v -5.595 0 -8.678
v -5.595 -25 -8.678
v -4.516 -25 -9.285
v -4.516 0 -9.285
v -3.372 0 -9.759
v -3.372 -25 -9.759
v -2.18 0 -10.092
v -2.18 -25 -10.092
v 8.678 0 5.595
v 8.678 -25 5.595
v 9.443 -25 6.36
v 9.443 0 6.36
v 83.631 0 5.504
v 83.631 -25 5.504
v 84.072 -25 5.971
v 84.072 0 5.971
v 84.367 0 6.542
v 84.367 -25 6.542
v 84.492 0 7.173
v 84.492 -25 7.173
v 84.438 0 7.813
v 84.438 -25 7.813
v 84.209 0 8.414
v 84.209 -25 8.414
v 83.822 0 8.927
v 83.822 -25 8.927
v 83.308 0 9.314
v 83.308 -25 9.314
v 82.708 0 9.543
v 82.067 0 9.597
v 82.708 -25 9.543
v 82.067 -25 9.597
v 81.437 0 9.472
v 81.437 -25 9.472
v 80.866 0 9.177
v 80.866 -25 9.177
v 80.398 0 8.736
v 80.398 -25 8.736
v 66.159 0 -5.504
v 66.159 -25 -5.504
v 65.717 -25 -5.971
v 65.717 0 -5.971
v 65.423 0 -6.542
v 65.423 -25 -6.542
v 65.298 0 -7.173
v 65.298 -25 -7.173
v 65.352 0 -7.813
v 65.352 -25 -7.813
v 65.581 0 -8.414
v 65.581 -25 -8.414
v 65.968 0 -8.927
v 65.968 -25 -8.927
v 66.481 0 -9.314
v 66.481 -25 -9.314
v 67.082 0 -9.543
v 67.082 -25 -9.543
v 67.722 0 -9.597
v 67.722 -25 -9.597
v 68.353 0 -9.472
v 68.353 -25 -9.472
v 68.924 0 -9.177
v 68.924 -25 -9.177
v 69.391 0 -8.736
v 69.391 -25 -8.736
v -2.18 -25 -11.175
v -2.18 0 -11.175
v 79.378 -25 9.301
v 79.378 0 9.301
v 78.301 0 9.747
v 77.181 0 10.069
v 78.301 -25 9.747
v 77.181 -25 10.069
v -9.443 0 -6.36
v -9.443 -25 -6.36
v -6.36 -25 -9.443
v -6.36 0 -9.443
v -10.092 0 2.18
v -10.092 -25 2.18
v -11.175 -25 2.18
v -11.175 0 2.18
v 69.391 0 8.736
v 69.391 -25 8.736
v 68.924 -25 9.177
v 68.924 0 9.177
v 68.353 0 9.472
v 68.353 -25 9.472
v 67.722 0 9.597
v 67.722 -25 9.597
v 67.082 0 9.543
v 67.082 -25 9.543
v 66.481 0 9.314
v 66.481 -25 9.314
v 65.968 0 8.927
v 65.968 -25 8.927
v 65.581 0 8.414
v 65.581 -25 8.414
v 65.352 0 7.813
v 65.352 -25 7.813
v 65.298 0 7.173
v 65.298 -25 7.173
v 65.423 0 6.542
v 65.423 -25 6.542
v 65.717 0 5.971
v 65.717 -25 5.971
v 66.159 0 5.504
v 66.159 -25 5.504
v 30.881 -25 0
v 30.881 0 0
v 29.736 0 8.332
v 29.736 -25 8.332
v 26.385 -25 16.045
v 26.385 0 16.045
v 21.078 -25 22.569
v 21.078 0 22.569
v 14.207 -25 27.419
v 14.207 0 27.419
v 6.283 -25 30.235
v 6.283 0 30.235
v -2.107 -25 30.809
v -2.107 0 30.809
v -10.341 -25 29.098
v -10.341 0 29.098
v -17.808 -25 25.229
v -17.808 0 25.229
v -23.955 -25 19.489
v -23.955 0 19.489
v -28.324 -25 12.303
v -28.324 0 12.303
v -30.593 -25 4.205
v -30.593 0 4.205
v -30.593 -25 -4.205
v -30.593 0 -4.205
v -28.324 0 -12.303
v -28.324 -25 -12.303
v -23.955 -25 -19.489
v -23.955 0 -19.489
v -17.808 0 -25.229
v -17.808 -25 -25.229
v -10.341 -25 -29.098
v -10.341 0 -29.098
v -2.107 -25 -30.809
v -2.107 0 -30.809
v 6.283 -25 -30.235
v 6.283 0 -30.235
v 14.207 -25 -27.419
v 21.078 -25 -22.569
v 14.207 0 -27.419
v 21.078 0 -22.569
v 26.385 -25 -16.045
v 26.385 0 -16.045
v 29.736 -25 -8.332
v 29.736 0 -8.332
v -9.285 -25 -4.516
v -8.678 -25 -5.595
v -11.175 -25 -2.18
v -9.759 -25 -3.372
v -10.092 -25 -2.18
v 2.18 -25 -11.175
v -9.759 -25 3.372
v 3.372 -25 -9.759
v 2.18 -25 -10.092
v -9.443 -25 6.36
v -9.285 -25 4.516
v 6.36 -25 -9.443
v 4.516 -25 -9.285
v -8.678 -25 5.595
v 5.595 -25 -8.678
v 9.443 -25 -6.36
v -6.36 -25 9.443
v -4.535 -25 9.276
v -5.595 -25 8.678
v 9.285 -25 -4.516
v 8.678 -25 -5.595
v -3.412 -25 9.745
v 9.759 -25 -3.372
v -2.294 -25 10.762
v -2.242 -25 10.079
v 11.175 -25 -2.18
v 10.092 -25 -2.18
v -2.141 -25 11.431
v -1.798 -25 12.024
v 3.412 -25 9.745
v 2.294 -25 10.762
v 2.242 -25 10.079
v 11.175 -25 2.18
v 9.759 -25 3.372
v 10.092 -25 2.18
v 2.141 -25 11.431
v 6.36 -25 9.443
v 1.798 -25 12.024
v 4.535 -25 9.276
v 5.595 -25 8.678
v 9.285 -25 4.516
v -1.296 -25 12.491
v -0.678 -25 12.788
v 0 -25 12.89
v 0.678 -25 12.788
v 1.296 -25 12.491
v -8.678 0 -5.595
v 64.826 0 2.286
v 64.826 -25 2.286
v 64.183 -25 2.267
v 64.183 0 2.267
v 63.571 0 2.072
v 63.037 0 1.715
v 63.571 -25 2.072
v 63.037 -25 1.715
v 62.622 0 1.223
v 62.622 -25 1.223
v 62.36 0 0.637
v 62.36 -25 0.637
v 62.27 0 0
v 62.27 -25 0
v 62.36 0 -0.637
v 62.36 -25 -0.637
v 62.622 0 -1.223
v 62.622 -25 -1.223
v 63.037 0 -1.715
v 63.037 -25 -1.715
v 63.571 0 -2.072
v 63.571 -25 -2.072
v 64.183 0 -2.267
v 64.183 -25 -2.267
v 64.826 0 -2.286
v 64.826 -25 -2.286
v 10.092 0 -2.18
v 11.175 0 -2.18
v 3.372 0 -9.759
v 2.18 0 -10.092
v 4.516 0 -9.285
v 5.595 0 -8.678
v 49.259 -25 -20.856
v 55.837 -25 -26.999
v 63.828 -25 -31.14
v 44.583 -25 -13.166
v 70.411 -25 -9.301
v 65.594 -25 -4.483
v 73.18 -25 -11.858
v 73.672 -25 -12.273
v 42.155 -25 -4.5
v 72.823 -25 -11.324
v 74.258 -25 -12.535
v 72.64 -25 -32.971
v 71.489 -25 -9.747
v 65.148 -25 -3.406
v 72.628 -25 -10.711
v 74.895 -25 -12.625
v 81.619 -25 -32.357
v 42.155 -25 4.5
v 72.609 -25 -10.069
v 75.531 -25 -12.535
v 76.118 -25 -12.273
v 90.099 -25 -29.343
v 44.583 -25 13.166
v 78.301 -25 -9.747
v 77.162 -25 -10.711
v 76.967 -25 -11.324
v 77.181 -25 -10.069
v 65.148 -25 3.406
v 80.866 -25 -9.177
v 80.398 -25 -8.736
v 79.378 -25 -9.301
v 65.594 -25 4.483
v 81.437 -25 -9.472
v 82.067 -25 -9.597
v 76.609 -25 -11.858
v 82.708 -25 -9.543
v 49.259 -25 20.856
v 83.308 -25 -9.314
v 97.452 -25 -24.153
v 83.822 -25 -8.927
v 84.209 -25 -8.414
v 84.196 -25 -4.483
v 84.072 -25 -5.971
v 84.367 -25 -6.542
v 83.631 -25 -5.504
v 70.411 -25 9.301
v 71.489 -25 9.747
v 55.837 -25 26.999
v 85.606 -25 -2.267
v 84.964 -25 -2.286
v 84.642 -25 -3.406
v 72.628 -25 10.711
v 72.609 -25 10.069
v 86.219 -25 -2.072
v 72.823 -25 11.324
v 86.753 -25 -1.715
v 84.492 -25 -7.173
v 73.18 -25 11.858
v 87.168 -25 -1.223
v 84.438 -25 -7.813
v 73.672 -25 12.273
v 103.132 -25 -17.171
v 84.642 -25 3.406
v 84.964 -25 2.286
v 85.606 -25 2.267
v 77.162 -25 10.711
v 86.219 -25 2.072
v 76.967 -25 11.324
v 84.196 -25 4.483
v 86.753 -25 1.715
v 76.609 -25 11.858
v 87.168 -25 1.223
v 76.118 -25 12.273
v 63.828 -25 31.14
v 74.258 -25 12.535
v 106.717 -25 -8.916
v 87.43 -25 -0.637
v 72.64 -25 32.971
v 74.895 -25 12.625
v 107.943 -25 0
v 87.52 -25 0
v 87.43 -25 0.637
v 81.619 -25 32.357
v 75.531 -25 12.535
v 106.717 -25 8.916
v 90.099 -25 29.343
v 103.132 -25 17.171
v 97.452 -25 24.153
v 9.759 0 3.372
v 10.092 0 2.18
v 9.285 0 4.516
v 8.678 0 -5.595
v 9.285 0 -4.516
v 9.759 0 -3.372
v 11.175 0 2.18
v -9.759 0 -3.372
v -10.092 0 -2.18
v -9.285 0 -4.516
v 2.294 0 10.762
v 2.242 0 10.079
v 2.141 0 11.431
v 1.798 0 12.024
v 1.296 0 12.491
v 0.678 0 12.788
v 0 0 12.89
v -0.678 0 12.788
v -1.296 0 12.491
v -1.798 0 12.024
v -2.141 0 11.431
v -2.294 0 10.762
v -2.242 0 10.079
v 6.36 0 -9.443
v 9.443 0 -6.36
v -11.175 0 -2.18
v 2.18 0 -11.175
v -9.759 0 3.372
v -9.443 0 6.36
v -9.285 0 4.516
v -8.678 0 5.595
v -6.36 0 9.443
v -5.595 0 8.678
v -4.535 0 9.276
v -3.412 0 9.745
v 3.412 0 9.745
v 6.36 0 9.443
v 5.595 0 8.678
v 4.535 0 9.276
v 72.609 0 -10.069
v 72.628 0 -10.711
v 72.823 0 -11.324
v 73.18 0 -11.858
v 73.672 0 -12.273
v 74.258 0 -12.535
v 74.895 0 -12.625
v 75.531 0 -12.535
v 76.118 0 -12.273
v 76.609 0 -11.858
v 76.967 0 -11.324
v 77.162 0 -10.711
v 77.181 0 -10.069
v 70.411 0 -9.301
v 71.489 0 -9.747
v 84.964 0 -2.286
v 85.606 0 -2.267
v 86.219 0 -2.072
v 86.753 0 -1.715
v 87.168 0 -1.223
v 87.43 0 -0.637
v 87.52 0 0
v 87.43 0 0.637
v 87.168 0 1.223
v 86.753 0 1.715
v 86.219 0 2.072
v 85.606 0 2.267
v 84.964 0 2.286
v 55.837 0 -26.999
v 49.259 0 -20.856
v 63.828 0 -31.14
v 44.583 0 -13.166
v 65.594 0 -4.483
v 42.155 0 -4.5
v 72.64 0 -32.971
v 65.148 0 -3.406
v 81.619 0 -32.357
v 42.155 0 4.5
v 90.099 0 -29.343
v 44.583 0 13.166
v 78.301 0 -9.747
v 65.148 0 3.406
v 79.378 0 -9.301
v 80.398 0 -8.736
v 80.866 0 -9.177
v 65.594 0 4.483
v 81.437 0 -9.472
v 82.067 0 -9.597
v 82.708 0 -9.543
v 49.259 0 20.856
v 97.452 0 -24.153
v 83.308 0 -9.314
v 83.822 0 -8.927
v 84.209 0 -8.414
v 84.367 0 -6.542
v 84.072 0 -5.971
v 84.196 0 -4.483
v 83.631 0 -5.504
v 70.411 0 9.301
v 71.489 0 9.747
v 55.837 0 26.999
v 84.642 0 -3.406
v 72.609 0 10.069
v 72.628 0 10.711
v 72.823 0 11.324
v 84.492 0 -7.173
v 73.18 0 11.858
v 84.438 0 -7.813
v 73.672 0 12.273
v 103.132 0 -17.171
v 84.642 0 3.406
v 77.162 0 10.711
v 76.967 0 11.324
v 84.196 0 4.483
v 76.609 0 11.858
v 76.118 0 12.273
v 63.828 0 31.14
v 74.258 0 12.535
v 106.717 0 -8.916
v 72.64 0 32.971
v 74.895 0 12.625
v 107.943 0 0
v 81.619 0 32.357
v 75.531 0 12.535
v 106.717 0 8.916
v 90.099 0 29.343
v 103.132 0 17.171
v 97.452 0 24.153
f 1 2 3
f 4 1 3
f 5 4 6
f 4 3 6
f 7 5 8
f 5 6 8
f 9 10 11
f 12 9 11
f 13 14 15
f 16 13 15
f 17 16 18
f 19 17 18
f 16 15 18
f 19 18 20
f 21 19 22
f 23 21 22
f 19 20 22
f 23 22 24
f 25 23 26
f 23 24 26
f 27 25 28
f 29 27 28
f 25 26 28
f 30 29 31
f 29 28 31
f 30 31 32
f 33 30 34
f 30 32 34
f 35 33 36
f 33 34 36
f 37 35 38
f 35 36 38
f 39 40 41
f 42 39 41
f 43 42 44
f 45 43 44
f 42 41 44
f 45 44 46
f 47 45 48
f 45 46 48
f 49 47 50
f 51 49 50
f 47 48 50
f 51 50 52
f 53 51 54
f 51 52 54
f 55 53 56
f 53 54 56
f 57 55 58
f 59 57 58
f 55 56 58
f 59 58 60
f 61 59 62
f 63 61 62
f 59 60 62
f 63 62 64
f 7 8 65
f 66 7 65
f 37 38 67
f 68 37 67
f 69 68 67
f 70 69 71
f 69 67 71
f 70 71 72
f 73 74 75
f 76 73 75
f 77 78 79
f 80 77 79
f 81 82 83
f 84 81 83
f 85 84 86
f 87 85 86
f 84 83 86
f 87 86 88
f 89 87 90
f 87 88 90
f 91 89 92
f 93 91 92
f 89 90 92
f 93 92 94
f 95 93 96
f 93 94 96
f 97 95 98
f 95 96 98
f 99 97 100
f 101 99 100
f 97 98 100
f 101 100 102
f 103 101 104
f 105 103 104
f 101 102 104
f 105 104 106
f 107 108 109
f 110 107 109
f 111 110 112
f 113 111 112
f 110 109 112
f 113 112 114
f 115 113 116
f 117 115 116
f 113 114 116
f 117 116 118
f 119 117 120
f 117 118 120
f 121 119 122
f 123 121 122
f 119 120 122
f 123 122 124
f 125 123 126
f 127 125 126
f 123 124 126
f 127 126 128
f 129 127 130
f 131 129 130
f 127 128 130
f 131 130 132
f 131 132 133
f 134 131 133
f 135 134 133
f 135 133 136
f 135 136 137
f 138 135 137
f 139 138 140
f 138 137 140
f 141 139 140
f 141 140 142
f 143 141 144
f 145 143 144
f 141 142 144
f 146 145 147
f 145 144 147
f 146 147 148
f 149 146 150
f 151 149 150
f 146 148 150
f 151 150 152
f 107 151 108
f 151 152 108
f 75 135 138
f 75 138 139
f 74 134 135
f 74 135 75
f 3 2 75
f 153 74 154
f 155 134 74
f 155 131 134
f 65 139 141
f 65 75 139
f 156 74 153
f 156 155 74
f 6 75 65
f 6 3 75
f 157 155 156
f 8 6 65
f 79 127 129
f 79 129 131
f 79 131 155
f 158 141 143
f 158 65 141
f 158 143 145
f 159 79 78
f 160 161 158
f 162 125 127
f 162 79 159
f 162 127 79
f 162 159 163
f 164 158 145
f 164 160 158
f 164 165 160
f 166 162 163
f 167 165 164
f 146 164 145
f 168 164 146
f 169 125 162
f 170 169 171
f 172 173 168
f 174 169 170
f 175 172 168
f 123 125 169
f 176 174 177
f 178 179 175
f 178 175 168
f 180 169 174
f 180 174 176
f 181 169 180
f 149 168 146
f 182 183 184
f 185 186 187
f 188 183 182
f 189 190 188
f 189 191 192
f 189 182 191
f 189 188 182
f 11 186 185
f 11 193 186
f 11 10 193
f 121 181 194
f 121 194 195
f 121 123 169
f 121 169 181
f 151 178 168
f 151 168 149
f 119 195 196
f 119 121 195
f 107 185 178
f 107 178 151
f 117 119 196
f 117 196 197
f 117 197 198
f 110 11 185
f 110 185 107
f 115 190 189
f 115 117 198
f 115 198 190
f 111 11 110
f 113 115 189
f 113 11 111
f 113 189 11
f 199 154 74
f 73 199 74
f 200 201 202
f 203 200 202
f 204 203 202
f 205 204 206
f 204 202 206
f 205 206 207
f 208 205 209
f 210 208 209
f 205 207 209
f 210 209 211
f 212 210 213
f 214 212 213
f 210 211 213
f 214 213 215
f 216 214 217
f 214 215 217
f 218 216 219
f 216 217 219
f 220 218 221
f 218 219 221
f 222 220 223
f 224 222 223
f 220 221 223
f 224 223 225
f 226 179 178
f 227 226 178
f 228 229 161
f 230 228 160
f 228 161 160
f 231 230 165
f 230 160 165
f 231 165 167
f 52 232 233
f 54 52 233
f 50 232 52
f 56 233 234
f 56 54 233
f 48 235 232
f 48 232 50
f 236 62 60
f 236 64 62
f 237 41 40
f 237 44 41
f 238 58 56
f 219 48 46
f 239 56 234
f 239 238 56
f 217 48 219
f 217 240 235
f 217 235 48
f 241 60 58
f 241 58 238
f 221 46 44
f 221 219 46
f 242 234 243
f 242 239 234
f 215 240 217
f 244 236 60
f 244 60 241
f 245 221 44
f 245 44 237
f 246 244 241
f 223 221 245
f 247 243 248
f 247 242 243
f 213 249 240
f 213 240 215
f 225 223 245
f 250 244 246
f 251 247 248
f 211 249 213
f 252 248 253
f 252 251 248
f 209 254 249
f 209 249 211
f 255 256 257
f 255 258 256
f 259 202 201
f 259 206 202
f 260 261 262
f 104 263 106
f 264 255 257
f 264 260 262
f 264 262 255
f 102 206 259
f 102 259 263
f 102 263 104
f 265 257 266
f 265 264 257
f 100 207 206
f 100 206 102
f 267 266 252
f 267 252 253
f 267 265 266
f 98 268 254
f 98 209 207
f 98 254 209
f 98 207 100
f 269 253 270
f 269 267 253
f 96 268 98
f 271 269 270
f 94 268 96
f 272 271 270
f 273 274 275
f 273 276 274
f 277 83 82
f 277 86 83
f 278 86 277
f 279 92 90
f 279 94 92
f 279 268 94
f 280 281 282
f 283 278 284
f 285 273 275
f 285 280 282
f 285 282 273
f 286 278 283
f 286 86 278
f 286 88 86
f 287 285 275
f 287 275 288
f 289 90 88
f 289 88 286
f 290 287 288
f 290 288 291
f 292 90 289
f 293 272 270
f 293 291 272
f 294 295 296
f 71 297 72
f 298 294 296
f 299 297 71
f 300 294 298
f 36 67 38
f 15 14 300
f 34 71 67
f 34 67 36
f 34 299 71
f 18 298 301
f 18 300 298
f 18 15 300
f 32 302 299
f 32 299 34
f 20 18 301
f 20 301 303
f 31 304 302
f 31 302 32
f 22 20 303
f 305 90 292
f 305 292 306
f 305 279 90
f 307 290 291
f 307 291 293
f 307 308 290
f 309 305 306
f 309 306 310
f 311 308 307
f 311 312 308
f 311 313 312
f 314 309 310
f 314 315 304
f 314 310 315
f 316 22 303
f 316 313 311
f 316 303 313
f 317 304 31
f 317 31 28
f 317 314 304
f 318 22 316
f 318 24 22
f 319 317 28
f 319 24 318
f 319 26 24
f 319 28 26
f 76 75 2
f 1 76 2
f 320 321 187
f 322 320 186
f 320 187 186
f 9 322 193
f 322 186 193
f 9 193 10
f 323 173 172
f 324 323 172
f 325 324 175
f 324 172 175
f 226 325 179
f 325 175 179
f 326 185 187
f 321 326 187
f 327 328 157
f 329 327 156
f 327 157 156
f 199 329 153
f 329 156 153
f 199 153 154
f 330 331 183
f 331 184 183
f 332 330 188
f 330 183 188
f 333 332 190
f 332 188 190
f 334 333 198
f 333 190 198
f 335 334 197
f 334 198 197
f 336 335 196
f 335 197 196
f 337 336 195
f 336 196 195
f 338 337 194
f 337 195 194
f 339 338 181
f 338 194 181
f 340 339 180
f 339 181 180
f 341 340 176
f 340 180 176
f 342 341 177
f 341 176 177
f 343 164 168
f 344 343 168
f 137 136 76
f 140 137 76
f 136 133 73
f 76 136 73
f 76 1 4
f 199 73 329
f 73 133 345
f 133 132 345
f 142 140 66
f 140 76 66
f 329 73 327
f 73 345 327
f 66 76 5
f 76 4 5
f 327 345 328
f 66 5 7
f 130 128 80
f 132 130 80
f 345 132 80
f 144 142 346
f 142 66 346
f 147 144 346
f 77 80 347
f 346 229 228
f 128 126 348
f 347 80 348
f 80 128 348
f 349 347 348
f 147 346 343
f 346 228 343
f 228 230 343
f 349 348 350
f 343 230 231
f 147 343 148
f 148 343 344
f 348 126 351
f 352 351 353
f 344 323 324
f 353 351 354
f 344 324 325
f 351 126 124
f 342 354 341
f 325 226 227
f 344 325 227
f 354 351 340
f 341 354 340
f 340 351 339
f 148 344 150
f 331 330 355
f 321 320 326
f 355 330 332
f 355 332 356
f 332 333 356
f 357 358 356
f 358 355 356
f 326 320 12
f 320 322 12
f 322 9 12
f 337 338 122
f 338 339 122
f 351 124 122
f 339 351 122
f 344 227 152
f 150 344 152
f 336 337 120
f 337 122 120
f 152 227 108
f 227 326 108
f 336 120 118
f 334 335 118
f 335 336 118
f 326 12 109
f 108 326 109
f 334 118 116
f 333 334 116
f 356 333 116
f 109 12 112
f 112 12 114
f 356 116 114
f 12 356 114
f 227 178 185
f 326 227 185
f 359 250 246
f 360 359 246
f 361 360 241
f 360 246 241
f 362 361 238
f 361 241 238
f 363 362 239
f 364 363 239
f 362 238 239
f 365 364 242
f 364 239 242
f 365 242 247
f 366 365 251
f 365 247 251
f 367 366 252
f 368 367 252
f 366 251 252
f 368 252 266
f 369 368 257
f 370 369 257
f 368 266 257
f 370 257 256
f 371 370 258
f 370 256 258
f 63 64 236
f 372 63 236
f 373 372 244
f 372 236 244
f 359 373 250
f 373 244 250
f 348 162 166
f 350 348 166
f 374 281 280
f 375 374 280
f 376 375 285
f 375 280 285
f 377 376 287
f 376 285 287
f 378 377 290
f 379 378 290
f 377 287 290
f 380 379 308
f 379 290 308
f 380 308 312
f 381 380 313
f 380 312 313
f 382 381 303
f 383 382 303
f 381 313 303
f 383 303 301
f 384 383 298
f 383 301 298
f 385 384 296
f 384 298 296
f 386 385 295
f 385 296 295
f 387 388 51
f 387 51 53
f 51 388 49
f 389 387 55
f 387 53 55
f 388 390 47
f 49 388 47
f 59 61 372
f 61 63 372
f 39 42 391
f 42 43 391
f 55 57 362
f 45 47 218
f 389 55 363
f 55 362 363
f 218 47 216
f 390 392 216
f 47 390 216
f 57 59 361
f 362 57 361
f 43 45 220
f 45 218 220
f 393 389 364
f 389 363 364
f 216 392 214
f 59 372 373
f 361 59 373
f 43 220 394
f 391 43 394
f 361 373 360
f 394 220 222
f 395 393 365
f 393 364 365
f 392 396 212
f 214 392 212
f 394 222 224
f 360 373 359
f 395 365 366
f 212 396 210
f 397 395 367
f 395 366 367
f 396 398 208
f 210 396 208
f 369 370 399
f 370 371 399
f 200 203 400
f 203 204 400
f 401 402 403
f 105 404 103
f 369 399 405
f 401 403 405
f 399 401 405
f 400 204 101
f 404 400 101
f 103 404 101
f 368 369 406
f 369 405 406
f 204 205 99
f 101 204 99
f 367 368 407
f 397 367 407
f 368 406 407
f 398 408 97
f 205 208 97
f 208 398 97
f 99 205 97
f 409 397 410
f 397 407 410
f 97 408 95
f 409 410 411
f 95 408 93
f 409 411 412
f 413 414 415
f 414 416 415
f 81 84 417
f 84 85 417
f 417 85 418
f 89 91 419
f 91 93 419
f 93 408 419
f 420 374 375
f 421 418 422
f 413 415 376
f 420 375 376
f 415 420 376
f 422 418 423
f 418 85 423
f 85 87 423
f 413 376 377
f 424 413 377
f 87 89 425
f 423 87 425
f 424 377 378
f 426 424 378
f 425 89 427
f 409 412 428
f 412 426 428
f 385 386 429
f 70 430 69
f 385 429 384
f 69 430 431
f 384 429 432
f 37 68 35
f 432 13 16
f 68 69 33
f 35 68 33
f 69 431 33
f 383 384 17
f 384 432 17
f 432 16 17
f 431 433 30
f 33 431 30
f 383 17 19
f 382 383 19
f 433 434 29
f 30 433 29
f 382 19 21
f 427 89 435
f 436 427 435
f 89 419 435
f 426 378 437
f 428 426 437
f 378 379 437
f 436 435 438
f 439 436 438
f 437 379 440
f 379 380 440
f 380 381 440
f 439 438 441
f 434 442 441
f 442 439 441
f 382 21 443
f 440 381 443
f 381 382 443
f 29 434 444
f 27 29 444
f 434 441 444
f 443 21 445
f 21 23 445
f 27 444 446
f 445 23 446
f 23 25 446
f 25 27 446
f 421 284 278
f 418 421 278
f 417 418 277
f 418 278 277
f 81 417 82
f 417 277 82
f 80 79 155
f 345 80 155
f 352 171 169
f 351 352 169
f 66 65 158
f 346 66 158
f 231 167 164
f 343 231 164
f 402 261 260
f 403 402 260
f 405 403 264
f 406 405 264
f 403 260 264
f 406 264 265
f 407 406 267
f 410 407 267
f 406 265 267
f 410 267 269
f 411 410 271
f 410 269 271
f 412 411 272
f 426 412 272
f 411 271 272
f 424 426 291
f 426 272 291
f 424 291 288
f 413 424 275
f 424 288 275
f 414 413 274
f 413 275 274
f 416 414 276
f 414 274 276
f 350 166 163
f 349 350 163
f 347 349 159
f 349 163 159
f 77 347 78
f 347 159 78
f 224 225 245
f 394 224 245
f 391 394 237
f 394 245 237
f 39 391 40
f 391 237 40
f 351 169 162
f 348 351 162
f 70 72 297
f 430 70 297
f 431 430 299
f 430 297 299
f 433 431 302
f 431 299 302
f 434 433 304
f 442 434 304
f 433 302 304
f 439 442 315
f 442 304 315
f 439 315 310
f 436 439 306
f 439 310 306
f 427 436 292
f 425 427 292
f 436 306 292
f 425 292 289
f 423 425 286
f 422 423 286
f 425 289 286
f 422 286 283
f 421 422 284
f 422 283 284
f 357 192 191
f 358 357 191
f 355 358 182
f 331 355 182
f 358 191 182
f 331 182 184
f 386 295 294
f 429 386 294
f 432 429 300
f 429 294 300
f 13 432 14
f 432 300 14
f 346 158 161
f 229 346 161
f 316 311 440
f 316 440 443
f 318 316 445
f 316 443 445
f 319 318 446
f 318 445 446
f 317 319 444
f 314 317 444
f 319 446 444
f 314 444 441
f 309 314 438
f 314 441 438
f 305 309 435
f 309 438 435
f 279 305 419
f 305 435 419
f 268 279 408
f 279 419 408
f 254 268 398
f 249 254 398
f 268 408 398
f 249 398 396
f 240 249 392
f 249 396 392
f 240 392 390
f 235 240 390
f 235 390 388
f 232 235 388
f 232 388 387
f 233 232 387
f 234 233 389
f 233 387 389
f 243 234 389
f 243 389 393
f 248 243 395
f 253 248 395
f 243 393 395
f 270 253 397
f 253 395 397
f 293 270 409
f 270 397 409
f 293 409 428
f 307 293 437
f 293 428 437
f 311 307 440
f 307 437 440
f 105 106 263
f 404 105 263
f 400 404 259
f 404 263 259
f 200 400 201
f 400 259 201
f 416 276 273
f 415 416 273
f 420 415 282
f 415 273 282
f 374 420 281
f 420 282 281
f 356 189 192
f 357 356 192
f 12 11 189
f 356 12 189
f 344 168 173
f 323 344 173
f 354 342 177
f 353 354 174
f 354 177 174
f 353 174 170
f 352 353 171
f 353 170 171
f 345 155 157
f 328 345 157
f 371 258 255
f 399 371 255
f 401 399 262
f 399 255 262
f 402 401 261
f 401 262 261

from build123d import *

# Parameters (mm, degrees)
F0_R     = 30.880918
F1_DEPTH = 25
F3_DEPTH = 25
F4_R     = 2.3
F5_DEPTH = 25
F6_R     = 33.047929
F7_DEPTH = 25
F9_DEPTH = 25


with BuildPart() as f1:
    # F0 (on Front) → F1 (new body)
    with BuildSketch(Plane.XZ):
        Circle(F0_R)
    extrude(amount=F1_DEPTH)

    # F2 (on face) → F3 (cut)
    with BuildSketch(Plane.XZ.offset(25)):
        with BuildLine():
            Line((-9.443411, 6.360425), (-8.677781, 5.594796))
            ThreePointArc((-8.677781, 5.594796), (-9.539056, 3.951206), (-10.092236, 2.18))
            Line((-10.092236, 2.18), (-11.175, 2.18))
            Line((-11.175, 2.18), (-11.175, -2.18))
            Line((-11.175, -2.18), (-10.092236, -2.18))
            ThreePointArc((-10.092236, -2.18), (-9.539056, -3.951206), (-8.677781, -5.594796))
            Line((-8.677781, -5.594796), (-9.443411, -6.360425))
            Line((-9.443411, -6.360425), (-6.360425, -9.443411))
            Line((-6.360425, -9.443411), (-5.594796, -8.677781))
            ThreePointArc((-5.594796, -8.677781), (-3.951206, -9.539056), (-2.18, -10.092236))
            Line((-2.18, -10.092236), (-2.18, -11.175))
            Line((-2.18, -11.175), (2.18, -11.175))
            Line((2.18, -11.175), (2.18, -10.092236))
            ThreePointArc((2.18, -10.092236), (3.951206, -9.539056), (5.594796, -8.677781))
            Line((5.594796, -8.677781), (6.360425, -9.443411))
            Line((6.360425, -9.443411), (9.443411, -6.360425))
            Line((9.443411, -6.360425), (8.677781, -5.594796))
            ThreePointArc((8.677781, -5.594796), (9.539056, -3.951206), (10.092236, -2.18))
            Line((10.092236, -2.18), (11.175, -2.18))
            Line((11.175, -2.18), (11.175, 2.18))
            Line((11.175, 2.18), (10.092236, 2.18))
            ThreePointArc((10.092236, 2.18), (9.539056, 3.951206), (8.677781, 5.594796))
            Line((8.677781, 5.594796), (9.443411, 6.360425))
            Line((9.443411, 6.360425), (6.360425, 9.443411))
            Line((6.360425, 9.443411), (5.594796, 8.677781))
            ThreePointArc((5.594796, 8.677781), (3.951206, 9.539056), (2.18, 10.092236))
            Line((2.18, 10.092236), (2.18, 11.175))
            Line((2.18, 11.175), (-2.18, 11.175))
            Line((-2.18, 11.175), (-2.18, 10.092236))
            ThreePointArc((-2.18, 10.092236), (-3.951206, 9.539056), (-5.594796, 8.677781))
            Line((-5.594796, 8.677781), (-6.360425, 9.443411))
            Line((-6.360425, 9.443411), (-9.443411, 6.360425))
        make_face()
    extrude(amount=-F3_DEPTH, mode=Mode.SUBTRACT)

    # F4 (on face) → F5 (cut)
    with BuildSketch(Plane.XZ.offset(25)):
        with Locations((0, 10.590222)):
            Circle(F4_R)
    extrude(amount=-F5_DEPTH, mode=Mode.SUBTRACT)


with BuildPart() as f7:
    # F6 (on Front) → F7 (new body)
    with BuildSketch(Plane.XZ):
        with Locations((74.894816, 0)):
            Circle(F6_R)
    extrude(amount=F7_DEPTH)

    # F8 (on face) → F9 (cut)
    with BuildSketch(Plane.XZ.offset(25)):
        with BuildLine():
            ThreePointArc((69.391307, 8.735961), (65.967593, 8.927223), (66.158855, 5.503509))
            ThreePointArc((66.158855, 5.503509), (65.35576, 3.951206), (64.82599, 2.285689))
            ThreePointArc((64.82599, 2.285689), (62.269816, 0), (64.82599, -2.285689))
            ThreePointArc((64.82599, -2.285689), (65.35576, -3.951206), (66.158855, -5.503509))
            ThreePointArc((66.158855, -5.503509), (65.967593, -8.927223), (69.391307, -8.735961))
            ThreePointArc((69.391307, -8.735961), (70.943609, -9.539056), (72.609127, -10.068826))
            ThreePointArc((72.609127, -10.068826), (74.894816, -12.625), (77.180505, -10.068826))
            ThreePointArc((77.180505, -10.068826), (78.846022, -9.539056), (80.398324, -8.735961))
            ThreePointArc((80.398324, -8.735961), (83.822039, -8.927223), (83.630777, -5.503509))
            ThreePointArc((83.630777, -5.503509), (84.433872, -3.951206), (84.963641, -2.285689))
            ThreePointArc((84.963641, -2.285689), (87.519816, 0), (84.963641, 2.285689))
            ThreePointArc((84.963641, 2.285689), (84.433872, 3.951206), (83.630777, 5.503509))
            ThreePointArc((83.630777, 5.503509), (83.822039, 8.927223), (80.398324, 8.735961))
            ThreePointArc((80.398324, 8.735961), (78.846022, 9.539056), (77.180505, 10.068826))
            ThreePointArc((77.180505, 10.068826), (74.894816, 12.625), (72.609127, 10.068826))
            ThreePointArc((72.609127, 10.068826), (70.943609, 9.539056), (69.391307, 8.735961))
        make_face()
    extrude(amount=-F9_DEPTH, mode=Mode.SUBTRACT)


solid = Compound([f1.part, f7.part])
